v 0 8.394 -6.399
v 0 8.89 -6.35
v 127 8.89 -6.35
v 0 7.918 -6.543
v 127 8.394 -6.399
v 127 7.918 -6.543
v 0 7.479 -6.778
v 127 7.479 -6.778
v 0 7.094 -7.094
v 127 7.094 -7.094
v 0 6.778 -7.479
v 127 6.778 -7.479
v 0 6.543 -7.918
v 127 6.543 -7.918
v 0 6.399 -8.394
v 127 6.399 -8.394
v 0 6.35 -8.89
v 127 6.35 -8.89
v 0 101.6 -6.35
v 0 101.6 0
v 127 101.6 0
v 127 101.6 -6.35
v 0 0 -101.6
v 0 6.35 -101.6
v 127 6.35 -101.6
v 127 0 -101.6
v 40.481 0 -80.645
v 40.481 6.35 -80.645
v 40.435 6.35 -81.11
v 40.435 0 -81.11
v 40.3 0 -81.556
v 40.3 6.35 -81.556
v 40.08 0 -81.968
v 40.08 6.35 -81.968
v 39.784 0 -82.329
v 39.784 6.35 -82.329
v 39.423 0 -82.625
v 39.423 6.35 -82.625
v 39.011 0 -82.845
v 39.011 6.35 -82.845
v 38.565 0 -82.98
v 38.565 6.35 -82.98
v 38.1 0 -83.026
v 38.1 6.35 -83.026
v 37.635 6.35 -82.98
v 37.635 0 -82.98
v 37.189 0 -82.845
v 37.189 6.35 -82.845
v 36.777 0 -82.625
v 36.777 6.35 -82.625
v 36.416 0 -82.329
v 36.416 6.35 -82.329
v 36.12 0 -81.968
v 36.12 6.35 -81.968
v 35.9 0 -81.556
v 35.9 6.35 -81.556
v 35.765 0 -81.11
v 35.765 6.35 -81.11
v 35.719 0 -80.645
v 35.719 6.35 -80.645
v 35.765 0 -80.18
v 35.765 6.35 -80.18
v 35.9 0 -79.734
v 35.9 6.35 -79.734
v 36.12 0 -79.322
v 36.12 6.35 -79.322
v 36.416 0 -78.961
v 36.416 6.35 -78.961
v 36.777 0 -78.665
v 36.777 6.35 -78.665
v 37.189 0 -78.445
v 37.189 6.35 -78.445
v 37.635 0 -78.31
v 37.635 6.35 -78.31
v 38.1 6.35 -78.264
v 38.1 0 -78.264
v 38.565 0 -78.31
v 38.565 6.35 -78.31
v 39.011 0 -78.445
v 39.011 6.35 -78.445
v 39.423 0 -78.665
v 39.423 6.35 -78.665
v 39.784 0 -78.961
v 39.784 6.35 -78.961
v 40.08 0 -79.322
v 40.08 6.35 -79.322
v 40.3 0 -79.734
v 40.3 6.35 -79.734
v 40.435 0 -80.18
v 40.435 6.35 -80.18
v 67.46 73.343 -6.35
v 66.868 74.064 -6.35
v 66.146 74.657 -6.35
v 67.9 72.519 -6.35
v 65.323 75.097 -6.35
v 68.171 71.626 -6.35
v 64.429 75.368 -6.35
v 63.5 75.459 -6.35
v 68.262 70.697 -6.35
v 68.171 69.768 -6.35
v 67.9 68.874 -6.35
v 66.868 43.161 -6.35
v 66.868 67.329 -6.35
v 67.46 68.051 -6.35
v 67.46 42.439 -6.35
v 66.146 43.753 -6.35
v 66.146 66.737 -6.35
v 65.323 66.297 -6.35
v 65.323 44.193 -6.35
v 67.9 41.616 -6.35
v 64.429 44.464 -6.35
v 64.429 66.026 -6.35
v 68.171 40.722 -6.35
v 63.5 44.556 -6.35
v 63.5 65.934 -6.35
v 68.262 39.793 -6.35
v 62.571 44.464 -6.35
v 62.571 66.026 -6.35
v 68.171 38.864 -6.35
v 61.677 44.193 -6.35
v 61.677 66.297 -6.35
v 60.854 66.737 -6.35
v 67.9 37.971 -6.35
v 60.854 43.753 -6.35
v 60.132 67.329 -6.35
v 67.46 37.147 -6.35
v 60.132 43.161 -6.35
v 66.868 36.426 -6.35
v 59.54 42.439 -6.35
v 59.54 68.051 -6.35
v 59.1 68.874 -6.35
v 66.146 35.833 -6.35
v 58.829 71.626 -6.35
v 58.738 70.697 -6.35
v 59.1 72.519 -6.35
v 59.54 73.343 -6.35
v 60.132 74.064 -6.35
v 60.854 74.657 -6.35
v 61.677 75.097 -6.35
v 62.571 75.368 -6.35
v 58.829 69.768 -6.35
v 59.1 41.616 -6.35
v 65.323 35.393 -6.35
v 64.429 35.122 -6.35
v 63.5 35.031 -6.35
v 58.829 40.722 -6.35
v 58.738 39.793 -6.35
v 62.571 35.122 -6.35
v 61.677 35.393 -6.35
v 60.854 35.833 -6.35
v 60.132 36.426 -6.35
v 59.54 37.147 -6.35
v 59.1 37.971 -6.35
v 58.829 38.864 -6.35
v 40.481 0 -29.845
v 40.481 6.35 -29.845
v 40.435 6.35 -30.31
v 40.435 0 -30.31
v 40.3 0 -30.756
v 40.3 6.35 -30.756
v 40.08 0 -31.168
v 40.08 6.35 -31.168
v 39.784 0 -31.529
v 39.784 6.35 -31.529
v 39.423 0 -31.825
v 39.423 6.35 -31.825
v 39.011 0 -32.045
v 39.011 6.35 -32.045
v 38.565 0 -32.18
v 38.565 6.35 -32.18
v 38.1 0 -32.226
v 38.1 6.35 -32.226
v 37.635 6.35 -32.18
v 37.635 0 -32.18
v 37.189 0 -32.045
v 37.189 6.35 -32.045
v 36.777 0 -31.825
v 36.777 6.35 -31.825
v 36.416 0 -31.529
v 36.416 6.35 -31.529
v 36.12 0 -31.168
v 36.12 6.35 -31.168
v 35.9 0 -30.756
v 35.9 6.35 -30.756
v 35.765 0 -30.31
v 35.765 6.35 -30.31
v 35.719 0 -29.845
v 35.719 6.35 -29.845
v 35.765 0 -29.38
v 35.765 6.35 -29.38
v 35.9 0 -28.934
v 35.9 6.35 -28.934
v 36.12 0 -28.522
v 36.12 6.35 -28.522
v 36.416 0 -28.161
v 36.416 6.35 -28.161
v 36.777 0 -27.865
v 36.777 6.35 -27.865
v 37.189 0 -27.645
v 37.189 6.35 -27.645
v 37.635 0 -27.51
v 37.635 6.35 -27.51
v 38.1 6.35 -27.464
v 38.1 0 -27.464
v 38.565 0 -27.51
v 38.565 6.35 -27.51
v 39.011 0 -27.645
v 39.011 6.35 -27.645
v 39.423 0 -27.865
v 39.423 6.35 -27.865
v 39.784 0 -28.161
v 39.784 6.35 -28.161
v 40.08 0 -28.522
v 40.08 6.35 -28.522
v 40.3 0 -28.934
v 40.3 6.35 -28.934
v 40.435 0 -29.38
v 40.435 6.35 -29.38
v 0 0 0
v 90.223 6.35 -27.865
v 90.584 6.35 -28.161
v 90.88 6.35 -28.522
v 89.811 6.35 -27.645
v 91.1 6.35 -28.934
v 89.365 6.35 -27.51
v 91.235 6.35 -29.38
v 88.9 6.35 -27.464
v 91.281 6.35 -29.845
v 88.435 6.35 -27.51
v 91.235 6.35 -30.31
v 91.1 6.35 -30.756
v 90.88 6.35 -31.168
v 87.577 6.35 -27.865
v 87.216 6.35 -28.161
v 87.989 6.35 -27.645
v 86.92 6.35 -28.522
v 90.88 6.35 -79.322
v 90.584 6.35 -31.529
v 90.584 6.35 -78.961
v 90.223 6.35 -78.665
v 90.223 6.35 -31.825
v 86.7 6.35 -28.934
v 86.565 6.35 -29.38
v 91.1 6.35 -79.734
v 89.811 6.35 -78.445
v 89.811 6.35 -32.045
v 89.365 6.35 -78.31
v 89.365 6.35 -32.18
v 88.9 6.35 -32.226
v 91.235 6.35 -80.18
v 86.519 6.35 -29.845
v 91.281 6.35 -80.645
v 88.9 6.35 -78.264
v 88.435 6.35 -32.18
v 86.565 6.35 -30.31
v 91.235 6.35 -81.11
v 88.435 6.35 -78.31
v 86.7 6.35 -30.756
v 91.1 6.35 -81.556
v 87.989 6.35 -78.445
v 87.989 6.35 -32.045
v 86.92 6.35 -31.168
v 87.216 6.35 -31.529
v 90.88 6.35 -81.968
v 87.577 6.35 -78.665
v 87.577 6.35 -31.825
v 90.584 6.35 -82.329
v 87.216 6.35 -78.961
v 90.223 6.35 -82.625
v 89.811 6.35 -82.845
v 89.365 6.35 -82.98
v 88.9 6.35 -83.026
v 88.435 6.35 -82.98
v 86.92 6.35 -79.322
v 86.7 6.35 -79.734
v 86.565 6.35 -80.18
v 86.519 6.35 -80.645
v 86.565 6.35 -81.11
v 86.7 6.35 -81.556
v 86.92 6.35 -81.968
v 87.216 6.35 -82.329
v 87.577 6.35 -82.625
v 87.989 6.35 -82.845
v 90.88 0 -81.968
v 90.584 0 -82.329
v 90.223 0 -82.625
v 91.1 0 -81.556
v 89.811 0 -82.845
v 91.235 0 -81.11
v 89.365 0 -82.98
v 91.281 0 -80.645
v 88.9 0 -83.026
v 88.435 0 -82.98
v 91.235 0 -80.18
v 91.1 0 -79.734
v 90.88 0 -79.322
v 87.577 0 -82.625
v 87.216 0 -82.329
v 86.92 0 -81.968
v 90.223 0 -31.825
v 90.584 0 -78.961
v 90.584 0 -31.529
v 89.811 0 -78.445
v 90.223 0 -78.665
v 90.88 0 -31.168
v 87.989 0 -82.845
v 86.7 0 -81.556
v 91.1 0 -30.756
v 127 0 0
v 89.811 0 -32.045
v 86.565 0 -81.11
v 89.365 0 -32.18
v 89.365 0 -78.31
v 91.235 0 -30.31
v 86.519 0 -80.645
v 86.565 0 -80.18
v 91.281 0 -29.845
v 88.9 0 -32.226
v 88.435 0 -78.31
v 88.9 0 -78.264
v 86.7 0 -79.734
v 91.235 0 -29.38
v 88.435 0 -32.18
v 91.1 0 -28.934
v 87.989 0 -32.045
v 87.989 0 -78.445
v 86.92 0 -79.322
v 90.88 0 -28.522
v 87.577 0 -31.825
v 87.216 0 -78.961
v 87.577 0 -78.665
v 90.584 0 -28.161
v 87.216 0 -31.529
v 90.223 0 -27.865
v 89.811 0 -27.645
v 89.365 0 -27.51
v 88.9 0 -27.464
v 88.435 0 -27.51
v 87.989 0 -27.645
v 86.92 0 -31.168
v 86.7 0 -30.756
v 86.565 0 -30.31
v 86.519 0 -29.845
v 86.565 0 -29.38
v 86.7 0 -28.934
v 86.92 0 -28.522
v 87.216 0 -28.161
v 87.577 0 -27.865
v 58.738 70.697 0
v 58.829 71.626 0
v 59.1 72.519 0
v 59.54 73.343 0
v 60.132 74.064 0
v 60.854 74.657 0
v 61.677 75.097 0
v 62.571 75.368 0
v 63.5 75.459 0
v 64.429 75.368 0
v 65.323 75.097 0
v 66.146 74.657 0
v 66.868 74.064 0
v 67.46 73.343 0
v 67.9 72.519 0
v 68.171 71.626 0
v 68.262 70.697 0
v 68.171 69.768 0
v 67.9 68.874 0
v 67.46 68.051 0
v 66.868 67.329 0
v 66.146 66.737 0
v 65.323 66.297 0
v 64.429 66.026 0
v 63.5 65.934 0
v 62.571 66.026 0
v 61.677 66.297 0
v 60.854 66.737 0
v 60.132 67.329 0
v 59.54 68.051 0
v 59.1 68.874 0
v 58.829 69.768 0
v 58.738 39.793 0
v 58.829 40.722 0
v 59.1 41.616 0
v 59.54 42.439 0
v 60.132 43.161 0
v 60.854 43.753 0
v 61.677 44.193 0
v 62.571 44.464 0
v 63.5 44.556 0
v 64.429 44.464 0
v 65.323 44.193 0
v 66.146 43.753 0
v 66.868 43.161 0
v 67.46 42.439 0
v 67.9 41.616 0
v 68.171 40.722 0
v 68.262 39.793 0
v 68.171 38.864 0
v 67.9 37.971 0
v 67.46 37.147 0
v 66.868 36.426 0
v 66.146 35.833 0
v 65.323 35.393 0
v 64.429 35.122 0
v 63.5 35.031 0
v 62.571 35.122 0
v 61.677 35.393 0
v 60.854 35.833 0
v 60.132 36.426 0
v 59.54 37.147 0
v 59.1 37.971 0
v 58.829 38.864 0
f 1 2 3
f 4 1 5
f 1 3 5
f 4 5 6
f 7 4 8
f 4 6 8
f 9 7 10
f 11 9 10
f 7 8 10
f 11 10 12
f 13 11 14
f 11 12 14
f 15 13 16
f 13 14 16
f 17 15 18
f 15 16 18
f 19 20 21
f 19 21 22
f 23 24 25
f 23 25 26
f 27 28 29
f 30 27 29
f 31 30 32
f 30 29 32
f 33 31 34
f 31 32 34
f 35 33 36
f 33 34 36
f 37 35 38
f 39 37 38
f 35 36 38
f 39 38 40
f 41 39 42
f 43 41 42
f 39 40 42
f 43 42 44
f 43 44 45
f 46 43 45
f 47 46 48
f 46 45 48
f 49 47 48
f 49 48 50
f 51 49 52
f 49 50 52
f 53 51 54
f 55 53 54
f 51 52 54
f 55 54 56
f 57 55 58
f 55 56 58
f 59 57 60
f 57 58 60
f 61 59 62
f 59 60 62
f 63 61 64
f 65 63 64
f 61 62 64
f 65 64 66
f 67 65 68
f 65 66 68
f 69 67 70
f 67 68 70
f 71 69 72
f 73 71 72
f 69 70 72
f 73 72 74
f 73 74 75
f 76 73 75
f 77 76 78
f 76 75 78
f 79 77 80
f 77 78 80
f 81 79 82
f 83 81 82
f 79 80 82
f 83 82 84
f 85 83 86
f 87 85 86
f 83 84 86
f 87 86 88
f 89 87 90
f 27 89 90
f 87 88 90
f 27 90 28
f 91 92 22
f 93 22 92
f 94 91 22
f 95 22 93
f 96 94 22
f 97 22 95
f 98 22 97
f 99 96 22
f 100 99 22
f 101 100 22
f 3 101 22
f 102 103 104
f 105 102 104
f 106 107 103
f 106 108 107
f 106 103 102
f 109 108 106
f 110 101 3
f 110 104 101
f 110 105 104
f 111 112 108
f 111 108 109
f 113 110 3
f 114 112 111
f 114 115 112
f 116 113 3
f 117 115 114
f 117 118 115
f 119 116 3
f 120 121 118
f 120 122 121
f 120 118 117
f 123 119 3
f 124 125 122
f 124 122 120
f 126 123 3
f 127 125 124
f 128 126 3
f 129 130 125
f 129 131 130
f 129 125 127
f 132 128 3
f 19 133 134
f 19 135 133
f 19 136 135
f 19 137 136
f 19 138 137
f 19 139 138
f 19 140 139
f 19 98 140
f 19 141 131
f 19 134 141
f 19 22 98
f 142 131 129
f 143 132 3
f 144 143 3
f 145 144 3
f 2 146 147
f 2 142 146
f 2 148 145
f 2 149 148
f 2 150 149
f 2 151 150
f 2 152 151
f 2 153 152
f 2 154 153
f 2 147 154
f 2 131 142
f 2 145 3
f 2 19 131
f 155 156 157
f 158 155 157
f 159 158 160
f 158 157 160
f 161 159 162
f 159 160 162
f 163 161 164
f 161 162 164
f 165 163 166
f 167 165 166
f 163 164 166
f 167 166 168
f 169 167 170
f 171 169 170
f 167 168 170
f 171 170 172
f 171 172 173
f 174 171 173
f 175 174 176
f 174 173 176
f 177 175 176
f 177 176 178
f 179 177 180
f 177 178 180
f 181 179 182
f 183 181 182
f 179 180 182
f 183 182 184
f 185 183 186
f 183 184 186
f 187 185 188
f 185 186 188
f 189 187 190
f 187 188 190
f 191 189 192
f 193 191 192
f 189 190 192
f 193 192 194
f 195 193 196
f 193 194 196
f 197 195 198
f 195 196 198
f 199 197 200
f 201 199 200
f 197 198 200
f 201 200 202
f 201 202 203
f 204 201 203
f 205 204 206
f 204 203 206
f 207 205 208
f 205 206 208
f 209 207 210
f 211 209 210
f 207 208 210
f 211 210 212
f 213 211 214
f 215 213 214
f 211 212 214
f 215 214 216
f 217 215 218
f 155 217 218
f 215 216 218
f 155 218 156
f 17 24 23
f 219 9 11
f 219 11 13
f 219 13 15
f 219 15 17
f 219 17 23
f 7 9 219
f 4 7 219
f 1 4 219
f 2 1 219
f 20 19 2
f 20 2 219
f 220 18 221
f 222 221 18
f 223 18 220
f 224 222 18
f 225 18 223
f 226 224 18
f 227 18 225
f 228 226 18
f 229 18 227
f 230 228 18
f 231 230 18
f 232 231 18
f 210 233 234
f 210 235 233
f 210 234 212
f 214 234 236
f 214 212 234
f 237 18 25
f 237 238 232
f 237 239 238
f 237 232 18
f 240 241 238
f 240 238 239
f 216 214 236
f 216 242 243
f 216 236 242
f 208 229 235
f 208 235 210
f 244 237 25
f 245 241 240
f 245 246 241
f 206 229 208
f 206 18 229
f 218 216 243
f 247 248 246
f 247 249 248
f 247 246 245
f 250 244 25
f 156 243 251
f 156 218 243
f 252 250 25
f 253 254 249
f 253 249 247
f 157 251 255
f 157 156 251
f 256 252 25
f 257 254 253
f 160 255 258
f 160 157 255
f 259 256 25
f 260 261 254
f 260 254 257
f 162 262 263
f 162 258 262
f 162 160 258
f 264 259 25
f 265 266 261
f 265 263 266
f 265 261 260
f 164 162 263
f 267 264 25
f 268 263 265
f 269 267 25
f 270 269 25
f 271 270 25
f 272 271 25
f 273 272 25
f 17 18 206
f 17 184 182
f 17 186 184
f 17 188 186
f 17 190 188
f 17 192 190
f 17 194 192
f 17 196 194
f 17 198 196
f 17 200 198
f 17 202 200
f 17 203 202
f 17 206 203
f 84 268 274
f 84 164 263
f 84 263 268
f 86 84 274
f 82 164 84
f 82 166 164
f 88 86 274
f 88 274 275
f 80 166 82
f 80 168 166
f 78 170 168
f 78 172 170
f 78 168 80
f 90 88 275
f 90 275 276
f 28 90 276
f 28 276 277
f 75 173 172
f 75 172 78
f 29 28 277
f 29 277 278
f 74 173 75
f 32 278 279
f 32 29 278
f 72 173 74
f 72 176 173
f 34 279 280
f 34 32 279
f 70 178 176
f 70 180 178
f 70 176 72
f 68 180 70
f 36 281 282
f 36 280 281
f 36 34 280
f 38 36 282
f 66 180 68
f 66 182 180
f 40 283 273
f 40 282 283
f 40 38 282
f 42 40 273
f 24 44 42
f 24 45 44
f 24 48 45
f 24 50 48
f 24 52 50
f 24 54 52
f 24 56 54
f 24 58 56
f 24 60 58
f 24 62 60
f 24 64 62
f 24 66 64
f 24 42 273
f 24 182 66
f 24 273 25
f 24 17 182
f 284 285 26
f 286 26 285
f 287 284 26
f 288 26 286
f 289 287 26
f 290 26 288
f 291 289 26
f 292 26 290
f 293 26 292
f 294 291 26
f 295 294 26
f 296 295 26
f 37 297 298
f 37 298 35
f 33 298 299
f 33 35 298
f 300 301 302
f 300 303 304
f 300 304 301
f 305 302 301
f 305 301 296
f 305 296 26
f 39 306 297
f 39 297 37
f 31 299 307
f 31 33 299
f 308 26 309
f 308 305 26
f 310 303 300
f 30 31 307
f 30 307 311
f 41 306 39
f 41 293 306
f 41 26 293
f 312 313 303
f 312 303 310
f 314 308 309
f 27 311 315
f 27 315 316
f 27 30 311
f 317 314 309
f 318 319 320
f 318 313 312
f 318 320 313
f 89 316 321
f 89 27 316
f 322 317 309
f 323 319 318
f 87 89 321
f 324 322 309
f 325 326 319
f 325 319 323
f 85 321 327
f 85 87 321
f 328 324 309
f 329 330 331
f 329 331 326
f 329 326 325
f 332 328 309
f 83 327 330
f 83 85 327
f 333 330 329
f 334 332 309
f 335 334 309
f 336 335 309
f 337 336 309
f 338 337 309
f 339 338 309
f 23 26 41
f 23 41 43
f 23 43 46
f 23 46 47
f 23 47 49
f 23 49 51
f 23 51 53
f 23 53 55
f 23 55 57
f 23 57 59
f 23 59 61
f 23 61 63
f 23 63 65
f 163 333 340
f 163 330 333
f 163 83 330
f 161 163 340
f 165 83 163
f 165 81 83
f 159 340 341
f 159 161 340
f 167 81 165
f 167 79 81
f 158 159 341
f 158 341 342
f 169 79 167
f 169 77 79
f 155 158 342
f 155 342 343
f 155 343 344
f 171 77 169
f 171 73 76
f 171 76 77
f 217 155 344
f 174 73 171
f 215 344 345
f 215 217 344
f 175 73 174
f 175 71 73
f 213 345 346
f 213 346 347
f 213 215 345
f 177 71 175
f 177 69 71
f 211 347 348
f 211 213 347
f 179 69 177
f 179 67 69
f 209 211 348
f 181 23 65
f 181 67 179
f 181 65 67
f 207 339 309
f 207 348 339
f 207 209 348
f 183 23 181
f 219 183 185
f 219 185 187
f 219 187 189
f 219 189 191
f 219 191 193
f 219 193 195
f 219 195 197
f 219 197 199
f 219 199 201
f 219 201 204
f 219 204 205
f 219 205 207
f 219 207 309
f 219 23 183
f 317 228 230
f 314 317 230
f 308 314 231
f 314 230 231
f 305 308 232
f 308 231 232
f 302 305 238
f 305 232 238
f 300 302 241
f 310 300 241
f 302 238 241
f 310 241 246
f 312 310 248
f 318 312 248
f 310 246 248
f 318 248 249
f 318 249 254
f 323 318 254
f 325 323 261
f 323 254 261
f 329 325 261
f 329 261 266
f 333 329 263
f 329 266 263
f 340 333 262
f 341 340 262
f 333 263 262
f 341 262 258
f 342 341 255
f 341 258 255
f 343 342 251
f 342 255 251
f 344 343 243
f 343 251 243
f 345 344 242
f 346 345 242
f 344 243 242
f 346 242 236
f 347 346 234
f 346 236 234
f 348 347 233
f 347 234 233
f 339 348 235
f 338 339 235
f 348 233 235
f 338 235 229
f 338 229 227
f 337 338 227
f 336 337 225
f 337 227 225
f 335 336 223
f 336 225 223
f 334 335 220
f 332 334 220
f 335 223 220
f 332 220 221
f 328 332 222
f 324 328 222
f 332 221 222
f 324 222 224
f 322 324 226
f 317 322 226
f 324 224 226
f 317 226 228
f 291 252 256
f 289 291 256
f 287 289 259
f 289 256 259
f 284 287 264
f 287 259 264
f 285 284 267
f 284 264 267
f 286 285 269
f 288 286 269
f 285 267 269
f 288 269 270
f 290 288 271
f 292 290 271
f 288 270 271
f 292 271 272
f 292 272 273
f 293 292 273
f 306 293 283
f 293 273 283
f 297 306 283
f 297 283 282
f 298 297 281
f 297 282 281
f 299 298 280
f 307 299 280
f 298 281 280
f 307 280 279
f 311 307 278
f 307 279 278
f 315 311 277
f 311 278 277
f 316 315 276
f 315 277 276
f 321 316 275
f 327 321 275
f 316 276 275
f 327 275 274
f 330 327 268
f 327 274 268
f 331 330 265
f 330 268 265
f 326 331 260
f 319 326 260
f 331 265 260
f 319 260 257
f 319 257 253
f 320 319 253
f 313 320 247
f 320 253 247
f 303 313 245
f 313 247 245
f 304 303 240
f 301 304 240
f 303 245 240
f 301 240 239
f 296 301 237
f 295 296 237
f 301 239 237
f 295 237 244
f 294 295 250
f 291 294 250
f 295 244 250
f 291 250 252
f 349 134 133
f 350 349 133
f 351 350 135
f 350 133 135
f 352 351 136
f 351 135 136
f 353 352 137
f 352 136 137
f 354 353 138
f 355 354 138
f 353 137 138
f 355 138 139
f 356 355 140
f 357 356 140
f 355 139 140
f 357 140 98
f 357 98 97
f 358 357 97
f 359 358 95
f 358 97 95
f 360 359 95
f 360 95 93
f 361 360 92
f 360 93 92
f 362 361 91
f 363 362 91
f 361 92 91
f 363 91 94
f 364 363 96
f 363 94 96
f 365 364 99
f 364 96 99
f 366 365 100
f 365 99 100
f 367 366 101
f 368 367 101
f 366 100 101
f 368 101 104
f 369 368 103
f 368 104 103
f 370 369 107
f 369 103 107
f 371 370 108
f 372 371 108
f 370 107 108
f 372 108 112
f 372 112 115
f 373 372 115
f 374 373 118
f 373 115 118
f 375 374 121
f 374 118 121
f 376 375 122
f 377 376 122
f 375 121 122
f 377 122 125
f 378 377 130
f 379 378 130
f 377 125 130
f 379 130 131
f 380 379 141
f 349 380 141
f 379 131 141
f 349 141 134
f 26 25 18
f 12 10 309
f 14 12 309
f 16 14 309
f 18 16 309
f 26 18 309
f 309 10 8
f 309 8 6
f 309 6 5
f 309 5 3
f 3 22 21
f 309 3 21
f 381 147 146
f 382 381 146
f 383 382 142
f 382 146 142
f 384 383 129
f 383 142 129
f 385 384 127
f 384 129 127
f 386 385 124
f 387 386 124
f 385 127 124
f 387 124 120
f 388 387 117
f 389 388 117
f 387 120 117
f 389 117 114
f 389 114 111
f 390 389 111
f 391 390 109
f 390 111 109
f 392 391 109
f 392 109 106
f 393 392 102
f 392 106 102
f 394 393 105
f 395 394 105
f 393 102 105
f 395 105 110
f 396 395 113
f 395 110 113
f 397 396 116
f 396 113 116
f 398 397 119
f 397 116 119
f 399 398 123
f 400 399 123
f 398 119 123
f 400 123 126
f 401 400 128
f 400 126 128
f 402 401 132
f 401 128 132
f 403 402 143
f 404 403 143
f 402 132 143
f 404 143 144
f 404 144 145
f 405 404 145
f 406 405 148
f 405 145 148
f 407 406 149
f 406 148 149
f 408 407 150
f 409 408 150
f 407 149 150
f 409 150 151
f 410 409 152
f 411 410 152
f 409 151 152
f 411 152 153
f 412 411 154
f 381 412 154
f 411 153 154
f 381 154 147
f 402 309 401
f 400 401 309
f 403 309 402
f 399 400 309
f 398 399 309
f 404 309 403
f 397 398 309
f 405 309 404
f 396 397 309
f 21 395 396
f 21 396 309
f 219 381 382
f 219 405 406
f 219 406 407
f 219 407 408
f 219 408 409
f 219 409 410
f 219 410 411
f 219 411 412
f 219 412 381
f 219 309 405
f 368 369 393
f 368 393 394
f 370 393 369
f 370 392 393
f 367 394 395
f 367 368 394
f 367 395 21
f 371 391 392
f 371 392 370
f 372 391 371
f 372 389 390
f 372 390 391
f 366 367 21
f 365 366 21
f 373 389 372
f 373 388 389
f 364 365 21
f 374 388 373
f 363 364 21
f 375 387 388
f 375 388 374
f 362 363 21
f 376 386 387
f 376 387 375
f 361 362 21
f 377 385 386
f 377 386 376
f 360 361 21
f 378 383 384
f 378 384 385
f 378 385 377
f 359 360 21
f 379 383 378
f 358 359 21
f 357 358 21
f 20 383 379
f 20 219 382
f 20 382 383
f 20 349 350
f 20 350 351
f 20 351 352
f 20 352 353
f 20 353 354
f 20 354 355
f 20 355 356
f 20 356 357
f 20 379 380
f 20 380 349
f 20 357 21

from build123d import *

# Parameters (mm, degrees)
BOSS_EXTRUDE1_DEPTH = 127
FILLET1_R           = 2.54
SKETCH2_R           = 4.7625
CUT_EXTRUDE1_DEPTH  = 6.35
SKETCH3_R           = 2.38125
CUT_EXTRUDE2_DEPTH  = 6.35


with BuildPart() as part:
    # Sketch1 → Boss-Extrude1 (new body)
    with BuildSketch(Plane(origin=(0, 0, 0), x_dir=(0, 0, -1), z_dir=(1, 0, 0))):
        Polygon((0, 0), (0, 101.6), (6.35, 101.6), (6.35, 6.35), (101.6, 6.35), (101.6, 0), align=None)
    extrude(amount=BOSS_EXTRUDE1_DEPTH)

    # Fillet1
    fillet1_edges = [part.edges().sort_by_distance(p)[0] for p in [
        (63.5, 6.35, -6.35),
    ]]
    fillet(fillet1_edges, radius=FILLET1_R)

    # Sketch2 → Cut-Extrude1 (cut)
    with BuildSketch(Plane(origin=(0, 0, -6.35), x_dir=(-1, 0, 0), z_dir=(0, 0, -1))):
        with Locations((-63.5, 70.696666667)):
            Circle(SKETCH2_R)
        with Locations((-63.5, 39.793333249)):
            Circle(SKETCH2_R)
    extrude(amount=-CUT_EXTRUDE1_DEPTH, mode=Mode.SUBTRACT)

    # Sketch3 → Cut-Extrude2 (cut)
    with BuildSketch(Plane(origin=(0, 6.35, 0), x_dir=(1, 0, 0), z_dir=(0, 1, 0))):
        with Locations((38.1, 80.645)):
            Circle(SKETCH3_R)
        with Locations((88.9, 80.645)):
            Circle(SKETCH3_R)
        with Locations((38.1, 29.845)):
            Circle(SKETCH3_R)
        with Locations((88.9, 29.845)):
            Circle(SKETCH3_R)
    extrude(amount=-CUT_EXTRUDE2_DEPTH, mode=Mode.SUBTRACT)


solid = part.part
